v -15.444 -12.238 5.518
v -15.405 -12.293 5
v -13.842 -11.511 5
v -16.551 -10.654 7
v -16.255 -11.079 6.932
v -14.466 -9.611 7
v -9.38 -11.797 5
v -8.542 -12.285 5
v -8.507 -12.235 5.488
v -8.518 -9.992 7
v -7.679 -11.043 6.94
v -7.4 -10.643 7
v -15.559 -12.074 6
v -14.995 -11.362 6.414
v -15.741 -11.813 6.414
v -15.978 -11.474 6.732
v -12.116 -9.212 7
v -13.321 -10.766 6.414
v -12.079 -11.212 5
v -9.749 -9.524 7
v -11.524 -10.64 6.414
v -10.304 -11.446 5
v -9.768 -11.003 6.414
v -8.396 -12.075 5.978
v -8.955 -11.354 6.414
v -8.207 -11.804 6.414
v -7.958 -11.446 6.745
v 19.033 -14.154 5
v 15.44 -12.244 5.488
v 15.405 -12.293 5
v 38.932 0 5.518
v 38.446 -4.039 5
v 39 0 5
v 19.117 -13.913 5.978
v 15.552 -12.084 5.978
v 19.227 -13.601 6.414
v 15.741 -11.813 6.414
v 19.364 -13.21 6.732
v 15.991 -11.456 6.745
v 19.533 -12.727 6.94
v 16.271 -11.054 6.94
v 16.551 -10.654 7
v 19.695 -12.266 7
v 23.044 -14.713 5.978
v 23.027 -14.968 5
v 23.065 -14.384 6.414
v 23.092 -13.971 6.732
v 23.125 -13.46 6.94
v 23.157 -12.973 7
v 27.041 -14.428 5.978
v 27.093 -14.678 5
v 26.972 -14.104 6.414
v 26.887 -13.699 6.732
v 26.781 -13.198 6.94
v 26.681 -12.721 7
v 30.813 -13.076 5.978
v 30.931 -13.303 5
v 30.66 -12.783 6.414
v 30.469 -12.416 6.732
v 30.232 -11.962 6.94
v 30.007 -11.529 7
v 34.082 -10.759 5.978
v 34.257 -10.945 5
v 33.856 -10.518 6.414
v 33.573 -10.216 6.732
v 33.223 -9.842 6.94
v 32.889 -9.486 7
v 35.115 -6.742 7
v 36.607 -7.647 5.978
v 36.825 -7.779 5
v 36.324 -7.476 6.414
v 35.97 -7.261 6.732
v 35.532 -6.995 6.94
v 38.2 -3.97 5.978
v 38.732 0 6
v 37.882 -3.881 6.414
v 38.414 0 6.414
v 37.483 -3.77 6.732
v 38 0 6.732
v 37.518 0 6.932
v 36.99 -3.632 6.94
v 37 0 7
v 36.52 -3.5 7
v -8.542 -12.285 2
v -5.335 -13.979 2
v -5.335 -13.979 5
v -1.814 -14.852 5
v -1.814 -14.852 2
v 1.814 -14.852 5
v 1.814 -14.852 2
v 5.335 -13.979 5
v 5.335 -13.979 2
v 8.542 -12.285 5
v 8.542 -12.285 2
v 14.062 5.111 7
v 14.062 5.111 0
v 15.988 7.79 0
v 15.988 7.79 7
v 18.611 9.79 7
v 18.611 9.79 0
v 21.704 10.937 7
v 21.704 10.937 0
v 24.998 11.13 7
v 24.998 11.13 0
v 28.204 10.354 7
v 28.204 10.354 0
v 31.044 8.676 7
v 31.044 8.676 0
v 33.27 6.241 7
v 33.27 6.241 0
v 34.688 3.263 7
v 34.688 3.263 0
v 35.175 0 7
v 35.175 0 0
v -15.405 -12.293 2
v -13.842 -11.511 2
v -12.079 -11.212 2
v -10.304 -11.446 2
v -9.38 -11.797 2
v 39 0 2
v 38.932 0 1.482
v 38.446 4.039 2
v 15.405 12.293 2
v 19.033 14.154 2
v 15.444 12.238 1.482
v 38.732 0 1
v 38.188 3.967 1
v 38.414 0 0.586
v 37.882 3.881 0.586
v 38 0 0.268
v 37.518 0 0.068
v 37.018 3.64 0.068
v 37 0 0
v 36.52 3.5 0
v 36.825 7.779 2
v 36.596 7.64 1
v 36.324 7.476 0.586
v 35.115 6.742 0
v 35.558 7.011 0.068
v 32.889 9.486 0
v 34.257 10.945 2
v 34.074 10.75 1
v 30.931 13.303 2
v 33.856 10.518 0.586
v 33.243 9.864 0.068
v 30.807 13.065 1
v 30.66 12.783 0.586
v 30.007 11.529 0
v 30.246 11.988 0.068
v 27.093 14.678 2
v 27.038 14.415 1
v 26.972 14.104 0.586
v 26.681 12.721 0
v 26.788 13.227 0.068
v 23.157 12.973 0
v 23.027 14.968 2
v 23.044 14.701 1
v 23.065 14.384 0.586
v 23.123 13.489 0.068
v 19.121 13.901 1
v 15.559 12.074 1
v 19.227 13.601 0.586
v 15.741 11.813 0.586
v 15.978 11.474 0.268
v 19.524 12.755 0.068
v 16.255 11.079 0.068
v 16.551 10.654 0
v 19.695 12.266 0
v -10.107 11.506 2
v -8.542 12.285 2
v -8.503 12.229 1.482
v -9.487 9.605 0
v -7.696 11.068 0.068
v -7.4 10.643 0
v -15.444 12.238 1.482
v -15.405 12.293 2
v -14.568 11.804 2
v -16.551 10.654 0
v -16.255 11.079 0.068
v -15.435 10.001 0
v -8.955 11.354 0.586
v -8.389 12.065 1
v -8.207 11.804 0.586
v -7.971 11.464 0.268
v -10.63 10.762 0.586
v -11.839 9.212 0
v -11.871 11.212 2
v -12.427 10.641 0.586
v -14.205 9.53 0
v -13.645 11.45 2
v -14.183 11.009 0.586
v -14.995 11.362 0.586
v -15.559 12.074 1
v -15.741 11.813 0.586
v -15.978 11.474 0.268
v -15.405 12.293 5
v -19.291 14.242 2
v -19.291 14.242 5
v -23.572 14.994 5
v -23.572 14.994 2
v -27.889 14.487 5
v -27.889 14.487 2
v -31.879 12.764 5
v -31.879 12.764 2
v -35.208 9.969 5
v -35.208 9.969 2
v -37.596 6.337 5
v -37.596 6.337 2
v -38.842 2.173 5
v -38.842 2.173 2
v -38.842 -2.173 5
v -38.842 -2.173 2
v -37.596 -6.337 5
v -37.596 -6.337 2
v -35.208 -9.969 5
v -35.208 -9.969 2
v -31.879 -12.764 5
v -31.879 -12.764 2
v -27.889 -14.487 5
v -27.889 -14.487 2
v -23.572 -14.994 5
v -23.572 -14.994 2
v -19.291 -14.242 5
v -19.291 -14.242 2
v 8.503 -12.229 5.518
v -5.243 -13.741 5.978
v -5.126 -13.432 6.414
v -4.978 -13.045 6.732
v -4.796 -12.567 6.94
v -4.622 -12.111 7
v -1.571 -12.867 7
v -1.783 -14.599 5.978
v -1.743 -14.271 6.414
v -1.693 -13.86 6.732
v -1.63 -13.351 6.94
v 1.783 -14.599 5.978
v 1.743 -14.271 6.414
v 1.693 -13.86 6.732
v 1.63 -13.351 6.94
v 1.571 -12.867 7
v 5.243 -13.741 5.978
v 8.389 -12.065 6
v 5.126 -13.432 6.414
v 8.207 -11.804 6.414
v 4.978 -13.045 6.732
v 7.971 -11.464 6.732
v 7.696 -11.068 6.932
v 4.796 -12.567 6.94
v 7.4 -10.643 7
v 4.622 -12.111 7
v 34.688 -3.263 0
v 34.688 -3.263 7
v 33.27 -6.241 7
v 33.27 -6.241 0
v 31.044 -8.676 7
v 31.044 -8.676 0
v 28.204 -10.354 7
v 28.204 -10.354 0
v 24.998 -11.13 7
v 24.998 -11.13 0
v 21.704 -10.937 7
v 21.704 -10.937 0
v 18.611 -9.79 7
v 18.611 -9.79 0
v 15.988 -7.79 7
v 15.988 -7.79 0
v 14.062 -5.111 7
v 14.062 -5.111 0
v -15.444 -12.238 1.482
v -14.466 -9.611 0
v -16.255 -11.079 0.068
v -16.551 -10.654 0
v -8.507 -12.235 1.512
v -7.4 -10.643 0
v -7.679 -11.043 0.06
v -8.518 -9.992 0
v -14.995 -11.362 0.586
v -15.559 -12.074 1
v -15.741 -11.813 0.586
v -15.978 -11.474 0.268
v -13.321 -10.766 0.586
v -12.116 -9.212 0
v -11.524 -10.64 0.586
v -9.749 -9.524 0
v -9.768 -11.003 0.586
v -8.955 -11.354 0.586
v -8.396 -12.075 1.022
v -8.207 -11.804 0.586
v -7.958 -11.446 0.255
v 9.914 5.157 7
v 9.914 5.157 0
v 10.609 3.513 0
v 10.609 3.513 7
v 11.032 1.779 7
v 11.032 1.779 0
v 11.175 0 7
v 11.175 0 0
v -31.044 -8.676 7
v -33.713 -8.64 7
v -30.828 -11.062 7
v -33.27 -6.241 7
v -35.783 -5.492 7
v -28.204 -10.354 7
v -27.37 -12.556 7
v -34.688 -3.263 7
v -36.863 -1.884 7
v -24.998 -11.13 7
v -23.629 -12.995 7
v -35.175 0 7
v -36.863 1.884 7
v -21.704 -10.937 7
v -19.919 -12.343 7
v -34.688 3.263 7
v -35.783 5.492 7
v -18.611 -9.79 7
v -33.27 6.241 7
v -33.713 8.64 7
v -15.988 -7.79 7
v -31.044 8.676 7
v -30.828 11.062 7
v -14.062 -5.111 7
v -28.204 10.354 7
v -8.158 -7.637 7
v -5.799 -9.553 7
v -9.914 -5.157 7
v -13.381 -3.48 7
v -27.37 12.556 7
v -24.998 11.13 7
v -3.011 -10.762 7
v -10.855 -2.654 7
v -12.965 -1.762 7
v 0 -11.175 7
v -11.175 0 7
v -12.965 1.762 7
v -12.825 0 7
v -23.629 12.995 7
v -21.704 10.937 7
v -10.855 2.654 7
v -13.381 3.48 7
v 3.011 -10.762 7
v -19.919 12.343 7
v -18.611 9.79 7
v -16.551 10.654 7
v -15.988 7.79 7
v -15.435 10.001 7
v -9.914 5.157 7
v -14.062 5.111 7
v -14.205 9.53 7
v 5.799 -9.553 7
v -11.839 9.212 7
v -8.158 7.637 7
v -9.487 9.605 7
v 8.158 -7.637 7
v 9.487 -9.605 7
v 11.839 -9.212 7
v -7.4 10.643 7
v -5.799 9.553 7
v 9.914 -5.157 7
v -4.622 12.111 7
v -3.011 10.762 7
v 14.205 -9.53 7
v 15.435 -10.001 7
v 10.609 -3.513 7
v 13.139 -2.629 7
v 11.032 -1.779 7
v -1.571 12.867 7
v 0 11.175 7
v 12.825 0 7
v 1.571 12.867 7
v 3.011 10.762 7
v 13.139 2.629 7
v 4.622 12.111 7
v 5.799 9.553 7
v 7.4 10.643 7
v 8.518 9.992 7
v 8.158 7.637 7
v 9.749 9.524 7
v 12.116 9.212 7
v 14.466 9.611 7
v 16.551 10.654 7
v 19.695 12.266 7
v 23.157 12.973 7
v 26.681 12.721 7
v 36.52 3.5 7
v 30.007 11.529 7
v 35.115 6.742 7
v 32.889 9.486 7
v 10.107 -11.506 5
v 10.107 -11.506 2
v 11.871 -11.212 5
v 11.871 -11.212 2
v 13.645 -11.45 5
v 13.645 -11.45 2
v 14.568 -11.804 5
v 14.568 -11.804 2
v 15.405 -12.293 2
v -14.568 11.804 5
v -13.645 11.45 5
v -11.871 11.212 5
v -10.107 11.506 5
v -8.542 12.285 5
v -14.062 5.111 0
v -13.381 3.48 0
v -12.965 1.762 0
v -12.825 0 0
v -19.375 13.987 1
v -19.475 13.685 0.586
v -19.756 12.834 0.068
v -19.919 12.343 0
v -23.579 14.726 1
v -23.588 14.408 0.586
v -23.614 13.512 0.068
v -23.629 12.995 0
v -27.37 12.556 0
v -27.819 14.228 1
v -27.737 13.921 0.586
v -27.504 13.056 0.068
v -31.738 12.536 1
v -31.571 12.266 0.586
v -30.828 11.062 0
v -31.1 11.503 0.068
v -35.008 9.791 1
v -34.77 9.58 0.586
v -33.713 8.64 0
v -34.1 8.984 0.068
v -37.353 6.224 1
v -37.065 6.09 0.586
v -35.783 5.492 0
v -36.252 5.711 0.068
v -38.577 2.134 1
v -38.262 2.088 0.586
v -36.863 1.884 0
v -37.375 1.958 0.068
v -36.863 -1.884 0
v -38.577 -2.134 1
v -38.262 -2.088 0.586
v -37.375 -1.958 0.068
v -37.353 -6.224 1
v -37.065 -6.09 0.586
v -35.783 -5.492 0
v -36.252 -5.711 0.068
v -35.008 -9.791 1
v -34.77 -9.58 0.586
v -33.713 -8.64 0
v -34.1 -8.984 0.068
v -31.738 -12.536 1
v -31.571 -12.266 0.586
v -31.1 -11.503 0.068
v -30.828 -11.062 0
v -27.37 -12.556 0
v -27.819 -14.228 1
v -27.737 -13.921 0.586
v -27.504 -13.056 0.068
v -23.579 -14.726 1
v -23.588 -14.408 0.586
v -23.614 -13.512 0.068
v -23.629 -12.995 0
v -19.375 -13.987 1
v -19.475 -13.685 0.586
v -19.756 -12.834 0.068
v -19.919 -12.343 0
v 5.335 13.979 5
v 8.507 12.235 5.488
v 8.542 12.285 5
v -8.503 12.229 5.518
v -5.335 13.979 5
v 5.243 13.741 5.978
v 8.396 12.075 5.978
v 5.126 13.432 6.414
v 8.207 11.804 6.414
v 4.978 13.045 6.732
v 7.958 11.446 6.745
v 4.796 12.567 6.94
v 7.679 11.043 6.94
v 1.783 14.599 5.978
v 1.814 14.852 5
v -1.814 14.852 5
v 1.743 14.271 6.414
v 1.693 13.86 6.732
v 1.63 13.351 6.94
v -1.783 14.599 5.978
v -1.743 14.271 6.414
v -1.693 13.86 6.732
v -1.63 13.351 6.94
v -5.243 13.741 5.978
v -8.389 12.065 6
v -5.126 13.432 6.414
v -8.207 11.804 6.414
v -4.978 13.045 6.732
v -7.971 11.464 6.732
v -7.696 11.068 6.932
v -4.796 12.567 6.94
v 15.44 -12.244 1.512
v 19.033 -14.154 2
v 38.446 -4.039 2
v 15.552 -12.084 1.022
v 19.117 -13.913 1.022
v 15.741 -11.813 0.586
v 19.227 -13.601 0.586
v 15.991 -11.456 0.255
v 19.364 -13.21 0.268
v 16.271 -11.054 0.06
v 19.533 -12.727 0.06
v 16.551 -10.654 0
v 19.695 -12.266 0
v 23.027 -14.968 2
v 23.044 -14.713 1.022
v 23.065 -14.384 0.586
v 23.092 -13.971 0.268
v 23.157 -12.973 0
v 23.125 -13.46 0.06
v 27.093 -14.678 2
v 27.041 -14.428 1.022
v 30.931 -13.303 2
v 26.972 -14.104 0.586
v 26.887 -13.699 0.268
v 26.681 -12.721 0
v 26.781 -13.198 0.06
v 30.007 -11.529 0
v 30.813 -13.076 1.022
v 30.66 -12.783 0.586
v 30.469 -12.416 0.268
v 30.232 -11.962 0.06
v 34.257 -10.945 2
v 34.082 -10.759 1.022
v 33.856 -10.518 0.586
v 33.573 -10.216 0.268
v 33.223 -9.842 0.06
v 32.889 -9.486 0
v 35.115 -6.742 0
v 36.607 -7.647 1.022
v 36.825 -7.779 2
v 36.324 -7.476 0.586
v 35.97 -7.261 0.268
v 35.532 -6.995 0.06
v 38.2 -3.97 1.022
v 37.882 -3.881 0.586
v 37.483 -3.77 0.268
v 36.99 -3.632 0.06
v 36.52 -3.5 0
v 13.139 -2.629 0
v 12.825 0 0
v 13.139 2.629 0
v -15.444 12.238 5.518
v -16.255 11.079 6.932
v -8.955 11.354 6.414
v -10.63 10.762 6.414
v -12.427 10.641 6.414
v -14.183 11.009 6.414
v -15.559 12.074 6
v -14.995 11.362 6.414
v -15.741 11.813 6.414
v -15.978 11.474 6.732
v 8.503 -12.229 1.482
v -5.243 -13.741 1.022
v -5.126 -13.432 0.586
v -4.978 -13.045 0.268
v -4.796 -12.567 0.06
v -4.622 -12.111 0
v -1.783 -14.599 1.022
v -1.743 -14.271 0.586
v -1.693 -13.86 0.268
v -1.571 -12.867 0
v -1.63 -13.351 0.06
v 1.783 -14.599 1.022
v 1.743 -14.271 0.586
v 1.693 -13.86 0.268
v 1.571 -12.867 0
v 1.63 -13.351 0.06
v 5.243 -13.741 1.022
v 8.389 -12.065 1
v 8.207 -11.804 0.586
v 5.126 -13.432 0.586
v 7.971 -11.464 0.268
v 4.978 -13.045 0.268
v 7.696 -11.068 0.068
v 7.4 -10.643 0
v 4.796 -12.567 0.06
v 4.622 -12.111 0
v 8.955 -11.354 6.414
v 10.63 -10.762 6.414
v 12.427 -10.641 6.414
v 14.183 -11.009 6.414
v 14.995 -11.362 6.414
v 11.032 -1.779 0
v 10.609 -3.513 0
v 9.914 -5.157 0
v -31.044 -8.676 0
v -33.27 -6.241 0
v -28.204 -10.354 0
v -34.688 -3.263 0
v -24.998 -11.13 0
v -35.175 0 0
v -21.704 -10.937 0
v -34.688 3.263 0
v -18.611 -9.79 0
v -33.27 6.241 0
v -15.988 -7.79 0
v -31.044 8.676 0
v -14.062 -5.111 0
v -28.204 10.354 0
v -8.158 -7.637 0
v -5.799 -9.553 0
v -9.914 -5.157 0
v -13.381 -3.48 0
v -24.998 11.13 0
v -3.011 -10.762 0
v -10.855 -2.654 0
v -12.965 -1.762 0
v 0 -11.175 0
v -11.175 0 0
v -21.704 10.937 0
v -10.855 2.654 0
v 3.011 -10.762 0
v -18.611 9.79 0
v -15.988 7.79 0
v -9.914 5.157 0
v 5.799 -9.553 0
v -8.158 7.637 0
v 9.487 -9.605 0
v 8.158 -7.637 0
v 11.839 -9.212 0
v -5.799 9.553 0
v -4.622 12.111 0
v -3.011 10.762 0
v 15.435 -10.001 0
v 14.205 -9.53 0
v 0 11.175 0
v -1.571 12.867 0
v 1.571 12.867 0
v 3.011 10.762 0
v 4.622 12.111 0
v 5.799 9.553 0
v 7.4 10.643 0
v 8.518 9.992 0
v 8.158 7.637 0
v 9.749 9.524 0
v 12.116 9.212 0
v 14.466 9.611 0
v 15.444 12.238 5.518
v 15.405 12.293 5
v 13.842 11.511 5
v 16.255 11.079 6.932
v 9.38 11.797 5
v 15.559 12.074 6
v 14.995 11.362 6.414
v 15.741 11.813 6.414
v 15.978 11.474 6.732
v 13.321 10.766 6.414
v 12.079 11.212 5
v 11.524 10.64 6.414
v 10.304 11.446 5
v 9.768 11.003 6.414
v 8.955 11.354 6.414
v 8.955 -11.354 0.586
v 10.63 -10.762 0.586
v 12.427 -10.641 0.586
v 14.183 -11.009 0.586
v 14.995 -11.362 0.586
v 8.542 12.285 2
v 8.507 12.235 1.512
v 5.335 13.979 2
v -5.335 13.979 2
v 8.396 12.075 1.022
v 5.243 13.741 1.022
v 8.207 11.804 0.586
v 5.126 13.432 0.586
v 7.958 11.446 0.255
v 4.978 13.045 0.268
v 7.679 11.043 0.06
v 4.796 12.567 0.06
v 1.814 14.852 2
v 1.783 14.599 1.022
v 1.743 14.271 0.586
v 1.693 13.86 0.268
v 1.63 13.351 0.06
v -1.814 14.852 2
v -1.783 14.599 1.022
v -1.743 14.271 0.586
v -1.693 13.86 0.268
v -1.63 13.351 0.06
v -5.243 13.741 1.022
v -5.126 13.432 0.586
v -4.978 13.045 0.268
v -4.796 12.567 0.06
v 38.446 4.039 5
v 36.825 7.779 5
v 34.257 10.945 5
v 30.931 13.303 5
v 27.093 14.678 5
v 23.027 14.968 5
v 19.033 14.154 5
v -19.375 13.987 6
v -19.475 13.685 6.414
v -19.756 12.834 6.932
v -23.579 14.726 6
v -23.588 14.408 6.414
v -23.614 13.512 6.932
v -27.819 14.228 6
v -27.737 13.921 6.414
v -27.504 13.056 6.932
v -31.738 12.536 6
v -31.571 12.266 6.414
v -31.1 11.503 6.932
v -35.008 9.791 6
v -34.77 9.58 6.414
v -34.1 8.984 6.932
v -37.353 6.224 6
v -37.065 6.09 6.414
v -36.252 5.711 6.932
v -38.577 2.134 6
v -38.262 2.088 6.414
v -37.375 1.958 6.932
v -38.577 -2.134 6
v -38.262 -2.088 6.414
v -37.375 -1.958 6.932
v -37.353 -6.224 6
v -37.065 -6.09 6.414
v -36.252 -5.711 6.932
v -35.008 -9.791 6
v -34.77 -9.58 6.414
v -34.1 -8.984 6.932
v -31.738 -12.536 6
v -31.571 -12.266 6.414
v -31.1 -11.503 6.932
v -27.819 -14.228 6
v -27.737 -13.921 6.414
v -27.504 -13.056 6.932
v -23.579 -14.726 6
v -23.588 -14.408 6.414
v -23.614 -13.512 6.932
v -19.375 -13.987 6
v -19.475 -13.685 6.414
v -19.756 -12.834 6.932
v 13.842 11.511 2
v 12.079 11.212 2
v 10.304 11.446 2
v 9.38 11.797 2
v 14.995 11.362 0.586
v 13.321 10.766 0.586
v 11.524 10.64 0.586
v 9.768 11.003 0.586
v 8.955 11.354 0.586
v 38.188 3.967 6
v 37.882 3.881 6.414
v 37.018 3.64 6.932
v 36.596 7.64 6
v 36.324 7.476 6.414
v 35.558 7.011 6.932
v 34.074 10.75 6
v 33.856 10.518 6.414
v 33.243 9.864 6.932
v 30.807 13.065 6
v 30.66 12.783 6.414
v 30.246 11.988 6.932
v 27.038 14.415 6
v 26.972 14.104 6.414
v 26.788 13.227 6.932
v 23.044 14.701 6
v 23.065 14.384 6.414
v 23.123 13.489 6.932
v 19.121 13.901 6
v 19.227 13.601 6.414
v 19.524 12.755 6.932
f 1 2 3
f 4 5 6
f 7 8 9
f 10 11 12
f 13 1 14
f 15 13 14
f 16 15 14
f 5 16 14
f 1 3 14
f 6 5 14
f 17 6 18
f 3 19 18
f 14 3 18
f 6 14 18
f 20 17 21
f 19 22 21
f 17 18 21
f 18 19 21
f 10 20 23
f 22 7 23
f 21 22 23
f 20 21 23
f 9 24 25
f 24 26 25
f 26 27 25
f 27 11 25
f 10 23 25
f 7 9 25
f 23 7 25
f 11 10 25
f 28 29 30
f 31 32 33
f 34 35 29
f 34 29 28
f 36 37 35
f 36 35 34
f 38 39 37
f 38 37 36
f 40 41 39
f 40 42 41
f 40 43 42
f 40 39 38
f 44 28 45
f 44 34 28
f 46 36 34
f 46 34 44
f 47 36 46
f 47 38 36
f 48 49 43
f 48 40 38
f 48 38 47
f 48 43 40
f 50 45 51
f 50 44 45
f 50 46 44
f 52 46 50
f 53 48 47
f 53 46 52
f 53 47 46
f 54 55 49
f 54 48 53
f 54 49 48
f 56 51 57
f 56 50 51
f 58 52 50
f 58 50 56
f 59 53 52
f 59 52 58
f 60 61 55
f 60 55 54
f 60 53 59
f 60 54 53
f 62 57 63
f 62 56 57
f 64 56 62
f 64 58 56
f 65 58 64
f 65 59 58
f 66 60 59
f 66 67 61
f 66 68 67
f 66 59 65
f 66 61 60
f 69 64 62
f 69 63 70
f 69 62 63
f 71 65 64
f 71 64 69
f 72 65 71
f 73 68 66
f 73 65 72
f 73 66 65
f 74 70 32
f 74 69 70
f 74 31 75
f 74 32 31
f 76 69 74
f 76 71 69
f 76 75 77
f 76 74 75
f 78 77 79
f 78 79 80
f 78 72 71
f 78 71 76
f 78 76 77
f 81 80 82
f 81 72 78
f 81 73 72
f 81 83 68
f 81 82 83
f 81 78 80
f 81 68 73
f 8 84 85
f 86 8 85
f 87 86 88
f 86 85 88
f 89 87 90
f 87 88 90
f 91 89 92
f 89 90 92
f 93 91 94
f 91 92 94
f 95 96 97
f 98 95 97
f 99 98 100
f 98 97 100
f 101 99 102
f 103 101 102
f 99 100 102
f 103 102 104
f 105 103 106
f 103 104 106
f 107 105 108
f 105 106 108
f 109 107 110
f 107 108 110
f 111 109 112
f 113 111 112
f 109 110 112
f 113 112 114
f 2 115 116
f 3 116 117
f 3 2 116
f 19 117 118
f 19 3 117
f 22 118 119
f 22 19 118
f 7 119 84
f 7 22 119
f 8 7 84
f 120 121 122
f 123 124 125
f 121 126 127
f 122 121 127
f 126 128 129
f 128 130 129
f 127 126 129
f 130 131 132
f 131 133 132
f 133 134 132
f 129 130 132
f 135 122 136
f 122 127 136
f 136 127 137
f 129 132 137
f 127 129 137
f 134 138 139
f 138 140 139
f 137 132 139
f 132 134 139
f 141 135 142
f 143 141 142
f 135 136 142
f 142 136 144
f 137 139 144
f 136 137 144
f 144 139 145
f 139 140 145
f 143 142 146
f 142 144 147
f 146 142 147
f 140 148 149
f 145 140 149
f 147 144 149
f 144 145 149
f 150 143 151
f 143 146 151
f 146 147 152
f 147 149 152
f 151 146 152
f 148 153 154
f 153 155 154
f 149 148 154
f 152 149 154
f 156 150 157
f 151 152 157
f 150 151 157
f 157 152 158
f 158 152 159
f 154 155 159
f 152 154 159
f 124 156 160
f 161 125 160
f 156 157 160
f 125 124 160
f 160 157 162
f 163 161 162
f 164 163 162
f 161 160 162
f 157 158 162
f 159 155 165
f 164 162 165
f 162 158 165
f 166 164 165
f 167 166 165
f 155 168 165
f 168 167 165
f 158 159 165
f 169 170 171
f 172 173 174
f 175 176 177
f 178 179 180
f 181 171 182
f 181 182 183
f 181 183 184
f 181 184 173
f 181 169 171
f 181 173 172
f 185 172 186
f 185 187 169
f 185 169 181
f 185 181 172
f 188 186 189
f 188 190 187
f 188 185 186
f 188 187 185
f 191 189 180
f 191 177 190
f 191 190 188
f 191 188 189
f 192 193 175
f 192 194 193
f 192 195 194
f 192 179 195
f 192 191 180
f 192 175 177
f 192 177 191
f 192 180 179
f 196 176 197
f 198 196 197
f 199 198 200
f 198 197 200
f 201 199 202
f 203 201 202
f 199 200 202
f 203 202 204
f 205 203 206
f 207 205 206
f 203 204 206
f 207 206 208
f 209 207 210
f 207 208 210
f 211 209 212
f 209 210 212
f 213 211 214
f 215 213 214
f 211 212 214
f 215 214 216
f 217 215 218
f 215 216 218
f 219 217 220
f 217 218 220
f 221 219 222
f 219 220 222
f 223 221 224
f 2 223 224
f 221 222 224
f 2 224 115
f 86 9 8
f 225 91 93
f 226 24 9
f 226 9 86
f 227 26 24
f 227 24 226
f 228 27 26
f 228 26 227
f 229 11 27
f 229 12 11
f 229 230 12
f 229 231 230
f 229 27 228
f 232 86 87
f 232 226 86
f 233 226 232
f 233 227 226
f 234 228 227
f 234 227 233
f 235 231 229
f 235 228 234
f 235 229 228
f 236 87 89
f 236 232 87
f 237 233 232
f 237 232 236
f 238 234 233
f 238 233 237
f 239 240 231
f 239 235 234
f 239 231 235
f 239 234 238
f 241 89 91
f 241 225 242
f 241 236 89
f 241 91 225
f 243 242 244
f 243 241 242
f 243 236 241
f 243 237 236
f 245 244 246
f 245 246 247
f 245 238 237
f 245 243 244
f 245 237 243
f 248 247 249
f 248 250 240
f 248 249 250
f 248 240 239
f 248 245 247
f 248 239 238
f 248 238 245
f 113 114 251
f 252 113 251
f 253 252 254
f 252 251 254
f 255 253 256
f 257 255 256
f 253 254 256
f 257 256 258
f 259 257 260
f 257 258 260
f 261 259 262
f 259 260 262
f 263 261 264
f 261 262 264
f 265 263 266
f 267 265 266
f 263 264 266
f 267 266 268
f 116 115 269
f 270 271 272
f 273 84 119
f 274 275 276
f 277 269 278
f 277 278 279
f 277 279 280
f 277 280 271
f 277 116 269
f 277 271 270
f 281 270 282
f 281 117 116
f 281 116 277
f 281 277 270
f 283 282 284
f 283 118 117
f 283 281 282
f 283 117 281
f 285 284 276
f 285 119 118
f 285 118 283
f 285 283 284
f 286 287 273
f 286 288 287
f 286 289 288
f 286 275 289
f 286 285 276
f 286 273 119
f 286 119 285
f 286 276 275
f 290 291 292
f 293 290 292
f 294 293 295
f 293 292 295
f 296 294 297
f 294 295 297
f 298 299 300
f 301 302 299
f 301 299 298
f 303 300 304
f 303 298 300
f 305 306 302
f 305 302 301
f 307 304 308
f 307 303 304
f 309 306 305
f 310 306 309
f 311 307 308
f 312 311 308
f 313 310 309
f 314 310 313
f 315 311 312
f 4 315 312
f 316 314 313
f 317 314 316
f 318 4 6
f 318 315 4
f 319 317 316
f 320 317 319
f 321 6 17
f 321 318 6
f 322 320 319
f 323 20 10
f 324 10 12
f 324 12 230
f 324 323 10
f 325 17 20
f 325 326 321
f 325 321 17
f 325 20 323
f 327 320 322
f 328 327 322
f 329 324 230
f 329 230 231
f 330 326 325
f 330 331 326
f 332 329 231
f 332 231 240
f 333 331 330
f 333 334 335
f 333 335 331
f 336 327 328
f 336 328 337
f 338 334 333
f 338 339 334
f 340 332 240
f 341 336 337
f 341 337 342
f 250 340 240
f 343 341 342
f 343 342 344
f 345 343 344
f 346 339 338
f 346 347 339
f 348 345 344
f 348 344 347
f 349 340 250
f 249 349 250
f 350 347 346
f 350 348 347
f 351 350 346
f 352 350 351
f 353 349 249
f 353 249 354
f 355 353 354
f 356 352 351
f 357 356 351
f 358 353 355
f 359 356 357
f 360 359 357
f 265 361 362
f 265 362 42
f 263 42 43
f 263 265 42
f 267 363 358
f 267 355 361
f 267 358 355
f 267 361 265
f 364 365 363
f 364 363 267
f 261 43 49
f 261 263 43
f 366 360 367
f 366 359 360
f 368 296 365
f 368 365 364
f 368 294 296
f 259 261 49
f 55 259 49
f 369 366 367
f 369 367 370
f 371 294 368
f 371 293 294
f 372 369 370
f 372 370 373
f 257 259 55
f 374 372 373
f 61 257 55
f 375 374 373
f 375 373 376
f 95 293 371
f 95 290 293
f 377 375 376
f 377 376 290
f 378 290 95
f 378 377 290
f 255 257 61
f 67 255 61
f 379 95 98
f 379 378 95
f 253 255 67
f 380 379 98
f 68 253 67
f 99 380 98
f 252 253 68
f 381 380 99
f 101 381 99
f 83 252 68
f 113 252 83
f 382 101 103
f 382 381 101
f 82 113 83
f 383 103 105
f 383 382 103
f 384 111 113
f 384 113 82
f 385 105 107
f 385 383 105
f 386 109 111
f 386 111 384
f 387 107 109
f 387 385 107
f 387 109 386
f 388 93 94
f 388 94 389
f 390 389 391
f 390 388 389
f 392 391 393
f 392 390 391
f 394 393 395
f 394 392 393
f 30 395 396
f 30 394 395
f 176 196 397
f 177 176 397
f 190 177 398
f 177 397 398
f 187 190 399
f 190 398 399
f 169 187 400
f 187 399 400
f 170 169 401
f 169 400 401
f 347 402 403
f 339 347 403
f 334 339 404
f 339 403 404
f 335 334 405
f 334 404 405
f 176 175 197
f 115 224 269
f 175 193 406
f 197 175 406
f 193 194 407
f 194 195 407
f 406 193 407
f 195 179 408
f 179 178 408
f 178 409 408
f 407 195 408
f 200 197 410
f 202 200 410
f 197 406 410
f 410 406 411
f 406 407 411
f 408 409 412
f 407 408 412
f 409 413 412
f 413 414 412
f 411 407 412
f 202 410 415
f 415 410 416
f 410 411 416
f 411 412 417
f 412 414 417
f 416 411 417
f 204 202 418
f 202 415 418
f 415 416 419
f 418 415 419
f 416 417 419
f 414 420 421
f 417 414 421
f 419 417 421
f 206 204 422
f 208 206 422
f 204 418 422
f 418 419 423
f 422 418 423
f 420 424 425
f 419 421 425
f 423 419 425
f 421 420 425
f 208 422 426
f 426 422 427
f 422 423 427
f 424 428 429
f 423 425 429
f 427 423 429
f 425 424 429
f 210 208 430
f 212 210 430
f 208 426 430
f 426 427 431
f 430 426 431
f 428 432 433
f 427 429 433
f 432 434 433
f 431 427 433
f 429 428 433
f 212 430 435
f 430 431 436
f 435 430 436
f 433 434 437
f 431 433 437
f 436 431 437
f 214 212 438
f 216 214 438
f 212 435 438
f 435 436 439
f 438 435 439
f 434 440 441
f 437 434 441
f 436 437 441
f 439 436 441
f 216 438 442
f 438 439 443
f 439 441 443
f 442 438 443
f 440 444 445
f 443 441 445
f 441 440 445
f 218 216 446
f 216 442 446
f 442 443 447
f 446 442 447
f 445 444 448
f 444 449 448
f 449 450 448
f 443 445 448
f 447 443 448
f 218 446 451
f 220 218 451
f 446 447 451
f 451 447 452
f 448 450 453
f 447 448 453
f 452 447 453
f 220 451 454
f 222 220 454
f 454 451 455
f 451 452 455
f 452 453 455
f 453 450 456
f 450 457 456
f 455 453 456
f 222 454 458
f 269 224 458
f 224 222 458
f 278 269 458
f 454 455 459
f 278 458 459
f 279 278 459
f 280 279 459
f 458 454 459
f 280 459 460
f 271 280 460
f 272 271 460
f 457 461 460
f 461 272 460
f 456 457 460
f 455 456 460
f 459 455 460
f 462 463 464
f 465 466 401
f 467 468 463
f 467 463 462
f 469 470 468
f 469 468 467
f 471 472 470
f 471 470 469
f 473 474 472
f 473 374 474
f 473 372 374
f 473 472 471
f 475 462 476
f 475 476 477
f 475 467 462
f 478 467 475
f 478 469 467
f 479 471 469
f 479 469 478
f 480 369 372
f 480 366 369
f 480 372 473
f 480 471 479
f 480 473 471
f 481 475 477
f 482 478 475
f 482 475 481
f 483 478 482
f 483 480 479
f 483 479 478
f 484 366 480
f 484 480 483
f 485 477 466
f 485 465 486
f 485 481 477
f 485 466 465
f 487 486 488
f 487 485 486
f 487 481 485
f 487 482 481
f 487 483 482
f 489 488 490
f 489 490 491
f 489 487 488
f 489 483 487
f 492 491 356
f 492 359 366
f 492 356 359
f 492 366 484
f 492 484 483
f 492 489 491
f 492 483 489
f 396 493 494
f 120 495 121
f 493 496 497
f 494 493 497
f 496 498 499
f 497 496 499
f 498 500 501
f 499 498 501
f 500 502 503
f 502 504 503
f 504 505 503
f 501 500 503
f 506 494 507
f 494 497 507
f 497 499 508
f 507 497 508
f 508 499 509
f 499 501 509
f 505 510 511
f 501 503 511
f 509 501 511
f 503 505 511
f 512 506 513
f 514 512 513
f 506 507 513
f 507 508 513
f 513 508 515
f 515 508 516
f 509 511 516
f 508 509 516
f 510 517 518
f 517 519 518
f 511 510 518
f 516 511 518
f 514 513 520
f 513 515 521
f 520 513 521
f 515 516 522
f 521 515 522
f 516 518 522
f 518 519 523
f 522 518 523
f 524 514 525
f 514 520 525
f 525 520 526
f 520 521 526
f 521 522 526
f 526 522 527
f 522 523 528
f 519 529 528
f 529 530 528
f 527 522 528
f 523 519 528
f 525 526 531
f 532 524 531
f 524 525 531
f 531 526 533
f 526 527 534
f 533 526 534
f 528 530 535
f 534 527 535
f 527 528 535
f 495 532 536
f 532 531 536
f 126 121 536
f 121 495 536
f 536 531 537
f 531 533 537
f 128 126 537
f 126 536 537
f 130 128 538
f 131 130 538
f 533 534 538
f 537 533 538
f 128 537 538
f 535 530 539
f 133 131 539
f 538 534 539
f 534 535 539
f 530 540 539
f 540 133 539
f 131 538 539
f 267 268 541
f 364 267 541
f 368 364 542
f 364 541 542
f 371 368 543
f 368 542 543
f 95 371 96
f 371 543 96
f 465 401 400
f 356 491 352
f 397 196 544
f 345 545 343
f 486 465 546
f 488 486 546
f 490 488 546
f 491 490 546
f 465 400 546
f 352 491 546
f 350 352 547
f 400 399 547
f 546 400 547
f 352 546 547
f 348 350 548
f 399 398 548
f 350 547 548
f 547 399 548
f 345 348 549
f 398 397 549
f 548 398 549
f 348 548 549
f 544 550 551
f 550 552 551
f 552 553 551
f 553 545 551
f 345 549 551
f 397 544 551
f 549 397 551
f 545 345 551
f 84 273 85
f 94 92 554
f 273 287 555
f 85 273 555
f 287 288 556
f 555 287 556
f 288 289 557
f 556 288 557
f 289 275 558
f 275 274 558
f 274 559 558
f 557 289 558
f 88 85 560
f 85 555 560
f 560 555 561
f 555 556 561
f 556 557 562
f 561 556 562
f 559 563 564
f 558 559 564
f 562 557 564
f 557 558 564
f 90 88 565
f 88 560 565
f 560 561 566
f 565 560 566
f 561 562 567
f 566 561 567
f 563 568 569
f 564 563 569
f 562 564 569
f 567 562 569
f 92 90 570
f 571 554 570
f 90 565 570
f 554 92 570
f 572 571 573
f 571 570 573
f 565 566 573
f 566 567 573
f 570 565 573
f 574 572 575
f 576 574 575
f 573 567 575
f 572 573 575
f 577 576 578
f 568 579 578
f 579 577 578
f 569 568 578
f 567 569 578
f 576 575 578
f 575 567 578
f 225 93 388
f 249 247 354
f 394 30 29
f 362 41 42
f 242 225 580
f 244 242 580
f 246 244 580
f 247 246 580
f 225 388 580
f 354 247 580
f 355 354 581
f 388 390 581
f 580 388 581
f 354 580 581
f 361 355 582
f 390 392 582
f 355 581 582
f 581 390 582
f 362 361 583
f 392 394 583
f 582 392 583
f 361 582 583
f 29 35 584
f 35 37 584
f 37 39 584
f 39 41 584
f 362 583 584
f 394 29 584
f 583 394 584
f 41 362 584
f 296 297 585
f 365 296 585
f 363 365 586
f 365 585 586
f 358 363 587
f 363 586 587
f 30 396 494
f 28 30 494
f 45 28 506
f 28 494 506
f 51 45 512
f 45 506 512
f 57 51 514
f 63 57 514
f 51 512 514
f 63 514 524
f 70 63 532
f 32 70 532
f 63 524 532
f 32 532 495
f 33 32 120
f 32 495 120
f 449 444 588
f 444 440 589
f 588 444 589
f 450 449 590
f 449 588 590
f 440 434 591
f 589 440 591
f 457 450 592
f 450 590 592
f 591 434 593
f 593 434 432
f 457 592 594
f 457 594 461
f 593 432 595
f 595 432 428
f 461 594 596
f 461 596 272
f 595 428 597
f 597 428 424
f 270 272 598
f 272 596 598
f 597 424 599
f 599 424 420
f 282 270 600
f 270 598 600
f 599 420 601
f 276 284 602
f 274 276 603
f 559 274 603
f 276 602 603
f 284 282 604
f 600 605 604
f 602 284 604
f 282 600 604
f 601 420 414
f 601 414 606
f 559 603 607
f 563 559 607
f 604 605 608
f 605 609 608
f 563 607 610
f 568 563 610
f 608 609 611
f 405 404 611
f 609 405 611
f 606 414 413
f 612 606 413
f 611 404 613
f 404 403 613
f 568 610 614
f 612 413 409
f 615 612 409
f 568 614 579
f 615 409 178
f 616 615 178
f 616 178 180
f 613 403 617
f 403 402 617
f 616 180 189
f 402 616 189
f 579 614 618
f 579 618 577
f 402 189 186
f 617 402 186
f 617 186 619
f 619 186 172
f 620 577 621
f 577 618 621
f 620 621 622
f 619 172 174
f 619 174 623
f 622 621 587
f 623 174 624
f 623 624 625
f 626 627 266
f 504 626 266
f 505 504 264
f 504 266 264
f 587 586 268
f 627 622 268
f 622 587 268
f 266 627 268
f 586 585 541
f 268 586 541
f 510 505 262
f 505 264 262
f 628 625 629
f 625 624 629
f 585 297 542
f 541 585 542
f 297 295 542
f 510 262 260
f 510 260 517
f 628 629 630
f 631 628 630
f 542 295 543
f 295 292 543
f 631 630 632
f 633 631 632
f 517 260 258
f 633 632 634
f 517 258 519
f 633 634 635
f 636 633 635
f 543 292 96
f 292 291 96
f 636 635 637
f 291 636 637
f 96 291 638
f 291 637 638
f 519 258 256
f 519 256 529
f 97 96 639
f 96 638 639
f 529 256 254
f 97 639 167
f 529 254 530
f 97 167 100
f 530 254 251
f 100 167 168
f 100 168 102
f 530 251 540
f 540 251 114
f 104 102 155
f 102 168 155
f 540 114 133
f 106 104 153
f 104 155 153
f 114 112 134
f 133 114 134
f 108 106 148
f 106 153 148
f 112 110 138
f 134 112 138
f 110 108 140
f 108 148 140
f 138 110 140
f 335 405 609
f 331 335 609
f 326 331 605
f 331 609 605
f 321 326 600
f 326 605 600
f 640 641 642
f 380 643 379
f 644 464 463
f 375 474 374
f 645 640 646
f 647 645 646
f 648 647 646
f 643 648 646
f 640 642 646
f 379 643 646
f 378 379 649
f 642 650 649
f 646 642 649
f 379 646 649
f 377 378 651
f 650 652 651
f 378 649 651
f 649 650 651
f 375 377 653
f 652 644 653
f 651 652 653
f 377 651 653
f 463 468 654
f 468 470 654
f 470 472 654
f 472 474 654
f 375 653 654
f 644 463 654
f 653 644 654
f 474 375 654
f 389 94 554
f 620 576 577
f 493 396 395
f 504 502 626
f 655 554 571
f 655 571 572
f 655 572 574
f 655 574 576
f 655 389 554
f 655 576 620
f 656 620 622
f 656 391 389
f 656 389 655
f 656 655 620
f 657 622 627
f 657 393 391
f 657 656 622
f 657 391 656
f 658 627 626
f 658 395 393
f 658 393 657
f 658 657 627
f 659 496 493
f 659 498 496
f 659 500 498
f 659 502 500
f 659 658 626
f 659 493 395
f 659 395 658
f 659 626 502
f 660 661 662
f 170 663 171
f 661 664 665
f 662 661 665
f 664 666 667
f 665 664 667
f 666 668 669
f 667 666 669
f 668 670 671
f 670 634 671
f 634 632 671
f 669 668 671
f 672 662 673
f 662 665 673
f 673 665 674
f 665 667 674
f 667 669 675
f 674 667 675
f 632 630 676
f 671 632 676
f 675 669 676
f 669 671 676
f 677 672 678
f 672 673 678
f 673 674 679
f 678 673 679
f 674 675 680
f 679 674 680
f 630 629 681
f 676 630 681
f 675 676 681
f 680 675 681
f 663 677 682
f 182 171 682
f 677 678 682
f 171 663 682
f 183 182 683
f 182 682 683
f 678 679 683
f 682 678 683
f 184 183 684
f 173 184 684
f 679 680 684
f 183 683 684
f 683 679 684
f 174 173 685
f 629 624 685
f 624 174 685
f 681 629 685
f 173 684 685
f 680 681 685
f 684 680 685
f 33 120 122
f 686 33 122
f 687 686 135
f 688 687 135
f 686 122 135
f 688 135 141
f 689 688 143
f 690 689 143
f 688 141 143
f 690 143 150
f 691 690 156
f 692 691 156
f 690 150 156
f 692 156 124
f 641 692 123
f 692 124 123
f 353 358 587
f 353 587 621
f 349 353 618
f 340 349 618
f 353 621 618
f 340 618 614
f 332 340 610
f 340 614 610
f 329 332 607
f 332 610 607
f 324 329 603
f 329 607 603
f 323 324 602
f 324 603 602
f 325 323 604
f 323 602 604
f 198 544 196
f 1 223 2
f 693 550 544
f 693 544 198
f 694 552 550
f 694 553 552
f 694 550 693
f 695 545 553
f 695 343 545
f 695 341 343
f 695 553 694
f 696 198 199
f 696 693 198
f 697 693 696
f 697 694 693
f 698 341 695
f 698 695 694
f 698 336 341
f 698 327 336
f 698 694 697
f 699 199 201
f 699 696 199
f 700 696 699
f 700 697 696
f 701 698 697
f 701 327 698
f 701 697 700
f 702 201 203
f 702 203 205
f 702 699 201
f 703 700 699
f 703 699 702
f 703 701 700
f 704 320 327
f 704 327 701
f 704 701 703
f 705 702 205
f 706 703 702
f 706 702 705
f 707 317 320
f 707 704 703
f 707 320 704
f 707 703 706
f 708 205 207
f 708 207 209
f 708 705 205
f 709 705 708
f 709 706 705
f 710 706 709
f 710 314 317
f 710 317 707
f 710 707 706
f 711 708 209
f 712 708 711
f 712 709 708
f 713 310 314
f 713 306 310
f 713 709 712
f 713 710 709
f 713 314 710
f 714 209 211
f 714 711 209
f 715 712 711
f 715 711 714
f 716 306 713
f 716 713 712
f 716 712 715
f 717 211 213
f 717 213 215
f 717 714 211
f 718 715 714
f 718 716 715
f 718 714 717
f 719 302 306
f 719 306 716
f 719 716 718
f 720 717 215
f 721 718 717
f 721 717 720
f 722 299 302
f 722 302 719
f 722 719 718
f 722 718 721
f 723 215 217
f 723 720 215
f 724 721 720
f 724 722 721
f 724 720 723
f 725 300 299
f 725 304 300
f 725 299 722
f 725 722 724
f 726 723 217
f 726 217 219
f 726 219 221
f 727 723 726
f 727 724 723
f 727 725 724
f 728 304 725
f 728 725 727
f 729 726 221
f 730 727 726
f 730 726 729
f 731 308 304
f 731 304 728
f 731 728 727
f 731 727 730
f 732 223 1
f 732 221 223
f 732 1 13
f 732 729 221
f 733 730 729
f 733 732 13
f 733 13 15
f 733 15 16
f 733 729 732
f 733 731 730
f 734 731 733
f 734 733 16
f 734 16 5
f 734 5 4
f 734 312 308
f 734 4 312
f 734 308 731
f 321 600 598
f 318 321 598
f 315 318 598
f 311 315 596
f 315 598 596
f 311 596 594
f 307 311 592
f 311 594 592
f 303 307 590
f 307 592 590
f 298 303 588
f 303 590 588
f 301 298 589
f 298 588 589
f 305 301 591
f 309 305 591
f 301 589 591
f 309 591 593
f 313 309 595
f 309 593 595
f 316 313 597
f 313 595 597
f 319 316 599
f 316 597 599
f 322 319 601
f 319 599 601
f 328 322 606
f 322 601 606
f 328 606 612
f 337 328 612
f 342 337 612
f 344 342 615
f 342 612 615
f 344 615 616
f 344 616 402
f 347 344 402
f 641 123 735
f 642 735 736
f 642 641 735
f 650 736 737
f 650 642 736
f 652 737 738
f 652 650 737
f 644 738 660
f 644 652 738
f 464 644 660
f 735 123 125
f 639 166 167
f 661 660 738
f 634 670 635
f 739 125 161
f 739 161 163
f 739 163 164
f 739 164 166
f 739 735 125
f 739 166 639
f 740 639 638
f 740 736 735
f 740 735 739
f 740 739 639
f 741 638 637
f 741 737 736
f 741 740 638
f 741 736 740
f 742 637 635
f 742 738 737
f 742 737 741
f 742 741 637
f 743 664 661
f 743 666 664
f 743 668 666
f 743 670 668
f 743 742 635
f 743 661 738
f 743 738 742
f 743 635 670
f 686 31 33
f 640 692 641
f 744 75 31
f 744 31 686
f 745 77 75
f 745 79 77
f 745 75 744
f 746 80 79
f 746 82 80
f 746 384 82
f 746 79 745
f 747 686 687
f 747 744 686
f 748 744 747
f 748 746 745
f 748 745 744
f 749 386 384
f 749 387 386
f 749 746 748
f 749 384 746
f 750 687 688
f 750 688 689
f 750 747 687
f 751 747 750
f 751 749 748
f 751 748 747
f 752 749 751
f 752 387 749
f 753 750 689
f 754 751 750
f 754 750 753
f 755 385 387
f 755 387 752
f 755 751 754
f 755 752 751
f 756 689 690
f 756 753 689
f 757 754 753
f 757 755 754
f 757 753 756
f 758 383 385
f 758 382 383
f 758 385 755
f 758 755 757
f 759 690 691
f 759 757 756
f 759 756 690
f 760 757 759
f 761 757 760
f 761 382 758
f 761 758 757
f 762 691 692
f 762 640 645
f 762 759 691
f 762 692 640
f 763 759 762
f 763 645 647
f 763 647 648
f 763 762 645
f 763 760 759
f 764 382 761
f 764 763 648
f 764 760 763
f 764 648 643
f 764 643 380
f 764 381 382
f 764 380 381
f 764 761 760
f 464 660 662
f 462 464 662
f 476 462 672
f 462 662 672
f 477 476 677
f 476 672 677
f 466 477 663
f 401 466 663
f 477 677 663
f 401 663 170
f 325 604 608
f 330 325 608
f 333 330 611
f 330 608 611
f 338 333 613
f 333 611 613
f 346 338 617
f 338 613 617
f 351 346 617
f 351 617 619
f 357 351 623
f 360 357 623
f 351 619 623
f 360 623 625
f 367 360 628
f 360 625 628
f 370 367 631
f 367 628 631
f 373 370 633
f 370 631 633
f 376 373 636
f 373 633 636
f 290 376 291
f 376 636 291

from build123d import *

# Parameters (mm, degrees)
F1_DEPTH = 7
F2_R     = 6
F3_R     = 2


# Not quite as in the source:
# - a feature names something its author has since deleted; it is built from what else it names


with BuildPart() as f1:
    # F0 (on Top) → F1 (new body)
    with BuildSketch(Plane.XY):
        with BuildLine():
            ThreePointArc((-14.0623969756, 5.1112299037), (-13.1615738007, 7.1167868393), (-11.9765766631, 8.9686839202))
            ThreePointArc((-11.9765766631, 8.9686839202), (-39, 0), (-11.9765766631, -8.9686839202))
            ThreePointArc((-11.9765766631, -8.9686839202), (-13.1615738007, -7.1167868393), (-14.0623969756, -5.1112299037))
            ThreePointArc((-14.0623969756, -5.1112299037), (-35.175, 0), (-14.0623969756, 5.1112299037))
        make_face()
        with BuildLine():
            ThreePointArc((-9.9141796875, -5.1565168597), (-11.175, 0), (-9.9141796875, 5.1565168597))
            ThreePointArc((-9.9141796875, 5.1565168597), (-10.8069599633, 7.1374851726), (-11.9765766631, 8.9686839202))
            ThreePointArc((-11.9765766631, 8.9686839202), (-13.1615738007, 7.1167868393), (-14.0623969756, 5.1112299037))
            ThreePointArc((-14.0623969756, 5.1112299037), (-13.1387537824, 2.6294401687), (-12.825, 0))
            ThreePointArc((-12.825, 0), (-13.1387537824, -2.6294401687), (-14.0623969756, -5.1112299037))
            ThreePointArc((-14.0623969756, -5.1112299037), (-13.1615738007, -7.1167868393), (-11.9765766631, -8.9686839202))
            ThreePointArc((-11.9765766631, -8.9686839202), (-10.8069599633, -7.1374851726), (-9.9141796875, -5.1565168597))
        make_face()
        with BuildLine():
            ThreePointArc((-9.9141796875, 5.1565168597), (0, 11.175), (9.9141796875, 5.1565168597))
            ThreePointArc((9.9141796875, 5.1565168597), (10.8069599633, 7.1374851726), (11.9765766631, 8.9686839202))
            ThreePointArc((11.9765766631, 8.9686839202), (0, 14.9624757252), (-11.9765766631, 8.9686839202))
            ThreePointArc((-11.9765766631, 8.9686839202), (-10.8069599633, 7.1374851726), (-9.9141796875, 5.1565168597))
        make_face()
        with BuildLine():
            ThreePointArc((9.9141796875, 5.1565168597), (10.8552195512, 2.6542105222), (11.175, 0))
            ThreePointArc((11.175, 0), (10.8552195512, -2.6542105222), (9.9141796875, -5.1565168597))
            ThreePointArc((9.9141796875, -5.1565168597), (10.8069599633, -7.1374851726), (11.9765766631, -8.9686839202))
            ThreePointArc((11.9765766631, -8.9686839202), (13.1615738007, -7.1167868393), (14.0623969756, -5.1112299037))
            ThreePointArc((14.0623969756, -5.1112299037), (12.825, 0), (14.0623969756, 5.1112299037))
            ThreePointArc((14.0623969756, 5.1112299037), (13.1615738007, 7.1167868393), (11.9765766631, 8.9686839202))
            ThreePointArc((11.9765766631, 8.9686839202), (10.8069599633, 7.1374851726), (9.9141796875, 5.1565168597))
        make_face()
        with BuildLine():
            ThreePointArc((39, 0), (28.724862429, 14.2364207239), (11.9765766631, 8.9686839202))
            ThreePointArc((11.9765766631, 8.9686839202), (13.1615738007, 7.1167868393), (14.0623969756, 5.1112299037))
            ThreePointArc((14.0623969756, 5.1112299037), (26.6294401687, 10.8612462176), (35.175, 0))
            ThreePointArc((35.175, 0), (26.6294401687, -10.8612462176), (14.0623969756, -5.1112299037))
            ThreePointArc((14.0623969756, -5.1112299037), (13.1615738007, -7.1167868393), (11.9765766631, -8.9686839202))
            ThreePointArc((11.9765766631, -8.9686839202), (28.724862429, -14.2364207239), (39, 0))
        make_face()
        with BuildLine():
            ThreePointArc((11.9765766631, -8.9686839202), (10.8069599633, -7.1374851726), (9.9141796875, -5.1565168597))
            ThreePointArc((9.9141796875, -5.1565168597), (0, -11.175), (-9.9141796875, -5.1565168597))
            ThreePointArc((-9.9141796875, -5.1565168597), (-10.8069599633, -7.1374851726), (-11.9765766631, -8.9686839202))
            ThreePointArc((-11.9765766631, -8.9686839202), (0, -14.9624757252), (11.9765766631, -8.9686839202))
        make_face()
    extrude(amount=F1_DEPTH)

    # F2
    f2_edges = [f1.edges().sort_by_distance(p)[0] for p in [
        (-11.976577, -8.968684, 3.5),
        (11.976577, -8.968684, 3.5),
        (11.976577, 8.968684, 3.5),
        (-11.976577, 8.968684, 3.5),
    ]]
    fillet(f2_edges, radius=F2_R)

    # F3
    f3_edges = [f1.edges().sort_by_distance(p)[0] for p in [
        (-39, 0, 7),
        (-39, 0, 0),
    ]]
    fillet(f3_edges, radius=F3_R)


solid = f1.part
